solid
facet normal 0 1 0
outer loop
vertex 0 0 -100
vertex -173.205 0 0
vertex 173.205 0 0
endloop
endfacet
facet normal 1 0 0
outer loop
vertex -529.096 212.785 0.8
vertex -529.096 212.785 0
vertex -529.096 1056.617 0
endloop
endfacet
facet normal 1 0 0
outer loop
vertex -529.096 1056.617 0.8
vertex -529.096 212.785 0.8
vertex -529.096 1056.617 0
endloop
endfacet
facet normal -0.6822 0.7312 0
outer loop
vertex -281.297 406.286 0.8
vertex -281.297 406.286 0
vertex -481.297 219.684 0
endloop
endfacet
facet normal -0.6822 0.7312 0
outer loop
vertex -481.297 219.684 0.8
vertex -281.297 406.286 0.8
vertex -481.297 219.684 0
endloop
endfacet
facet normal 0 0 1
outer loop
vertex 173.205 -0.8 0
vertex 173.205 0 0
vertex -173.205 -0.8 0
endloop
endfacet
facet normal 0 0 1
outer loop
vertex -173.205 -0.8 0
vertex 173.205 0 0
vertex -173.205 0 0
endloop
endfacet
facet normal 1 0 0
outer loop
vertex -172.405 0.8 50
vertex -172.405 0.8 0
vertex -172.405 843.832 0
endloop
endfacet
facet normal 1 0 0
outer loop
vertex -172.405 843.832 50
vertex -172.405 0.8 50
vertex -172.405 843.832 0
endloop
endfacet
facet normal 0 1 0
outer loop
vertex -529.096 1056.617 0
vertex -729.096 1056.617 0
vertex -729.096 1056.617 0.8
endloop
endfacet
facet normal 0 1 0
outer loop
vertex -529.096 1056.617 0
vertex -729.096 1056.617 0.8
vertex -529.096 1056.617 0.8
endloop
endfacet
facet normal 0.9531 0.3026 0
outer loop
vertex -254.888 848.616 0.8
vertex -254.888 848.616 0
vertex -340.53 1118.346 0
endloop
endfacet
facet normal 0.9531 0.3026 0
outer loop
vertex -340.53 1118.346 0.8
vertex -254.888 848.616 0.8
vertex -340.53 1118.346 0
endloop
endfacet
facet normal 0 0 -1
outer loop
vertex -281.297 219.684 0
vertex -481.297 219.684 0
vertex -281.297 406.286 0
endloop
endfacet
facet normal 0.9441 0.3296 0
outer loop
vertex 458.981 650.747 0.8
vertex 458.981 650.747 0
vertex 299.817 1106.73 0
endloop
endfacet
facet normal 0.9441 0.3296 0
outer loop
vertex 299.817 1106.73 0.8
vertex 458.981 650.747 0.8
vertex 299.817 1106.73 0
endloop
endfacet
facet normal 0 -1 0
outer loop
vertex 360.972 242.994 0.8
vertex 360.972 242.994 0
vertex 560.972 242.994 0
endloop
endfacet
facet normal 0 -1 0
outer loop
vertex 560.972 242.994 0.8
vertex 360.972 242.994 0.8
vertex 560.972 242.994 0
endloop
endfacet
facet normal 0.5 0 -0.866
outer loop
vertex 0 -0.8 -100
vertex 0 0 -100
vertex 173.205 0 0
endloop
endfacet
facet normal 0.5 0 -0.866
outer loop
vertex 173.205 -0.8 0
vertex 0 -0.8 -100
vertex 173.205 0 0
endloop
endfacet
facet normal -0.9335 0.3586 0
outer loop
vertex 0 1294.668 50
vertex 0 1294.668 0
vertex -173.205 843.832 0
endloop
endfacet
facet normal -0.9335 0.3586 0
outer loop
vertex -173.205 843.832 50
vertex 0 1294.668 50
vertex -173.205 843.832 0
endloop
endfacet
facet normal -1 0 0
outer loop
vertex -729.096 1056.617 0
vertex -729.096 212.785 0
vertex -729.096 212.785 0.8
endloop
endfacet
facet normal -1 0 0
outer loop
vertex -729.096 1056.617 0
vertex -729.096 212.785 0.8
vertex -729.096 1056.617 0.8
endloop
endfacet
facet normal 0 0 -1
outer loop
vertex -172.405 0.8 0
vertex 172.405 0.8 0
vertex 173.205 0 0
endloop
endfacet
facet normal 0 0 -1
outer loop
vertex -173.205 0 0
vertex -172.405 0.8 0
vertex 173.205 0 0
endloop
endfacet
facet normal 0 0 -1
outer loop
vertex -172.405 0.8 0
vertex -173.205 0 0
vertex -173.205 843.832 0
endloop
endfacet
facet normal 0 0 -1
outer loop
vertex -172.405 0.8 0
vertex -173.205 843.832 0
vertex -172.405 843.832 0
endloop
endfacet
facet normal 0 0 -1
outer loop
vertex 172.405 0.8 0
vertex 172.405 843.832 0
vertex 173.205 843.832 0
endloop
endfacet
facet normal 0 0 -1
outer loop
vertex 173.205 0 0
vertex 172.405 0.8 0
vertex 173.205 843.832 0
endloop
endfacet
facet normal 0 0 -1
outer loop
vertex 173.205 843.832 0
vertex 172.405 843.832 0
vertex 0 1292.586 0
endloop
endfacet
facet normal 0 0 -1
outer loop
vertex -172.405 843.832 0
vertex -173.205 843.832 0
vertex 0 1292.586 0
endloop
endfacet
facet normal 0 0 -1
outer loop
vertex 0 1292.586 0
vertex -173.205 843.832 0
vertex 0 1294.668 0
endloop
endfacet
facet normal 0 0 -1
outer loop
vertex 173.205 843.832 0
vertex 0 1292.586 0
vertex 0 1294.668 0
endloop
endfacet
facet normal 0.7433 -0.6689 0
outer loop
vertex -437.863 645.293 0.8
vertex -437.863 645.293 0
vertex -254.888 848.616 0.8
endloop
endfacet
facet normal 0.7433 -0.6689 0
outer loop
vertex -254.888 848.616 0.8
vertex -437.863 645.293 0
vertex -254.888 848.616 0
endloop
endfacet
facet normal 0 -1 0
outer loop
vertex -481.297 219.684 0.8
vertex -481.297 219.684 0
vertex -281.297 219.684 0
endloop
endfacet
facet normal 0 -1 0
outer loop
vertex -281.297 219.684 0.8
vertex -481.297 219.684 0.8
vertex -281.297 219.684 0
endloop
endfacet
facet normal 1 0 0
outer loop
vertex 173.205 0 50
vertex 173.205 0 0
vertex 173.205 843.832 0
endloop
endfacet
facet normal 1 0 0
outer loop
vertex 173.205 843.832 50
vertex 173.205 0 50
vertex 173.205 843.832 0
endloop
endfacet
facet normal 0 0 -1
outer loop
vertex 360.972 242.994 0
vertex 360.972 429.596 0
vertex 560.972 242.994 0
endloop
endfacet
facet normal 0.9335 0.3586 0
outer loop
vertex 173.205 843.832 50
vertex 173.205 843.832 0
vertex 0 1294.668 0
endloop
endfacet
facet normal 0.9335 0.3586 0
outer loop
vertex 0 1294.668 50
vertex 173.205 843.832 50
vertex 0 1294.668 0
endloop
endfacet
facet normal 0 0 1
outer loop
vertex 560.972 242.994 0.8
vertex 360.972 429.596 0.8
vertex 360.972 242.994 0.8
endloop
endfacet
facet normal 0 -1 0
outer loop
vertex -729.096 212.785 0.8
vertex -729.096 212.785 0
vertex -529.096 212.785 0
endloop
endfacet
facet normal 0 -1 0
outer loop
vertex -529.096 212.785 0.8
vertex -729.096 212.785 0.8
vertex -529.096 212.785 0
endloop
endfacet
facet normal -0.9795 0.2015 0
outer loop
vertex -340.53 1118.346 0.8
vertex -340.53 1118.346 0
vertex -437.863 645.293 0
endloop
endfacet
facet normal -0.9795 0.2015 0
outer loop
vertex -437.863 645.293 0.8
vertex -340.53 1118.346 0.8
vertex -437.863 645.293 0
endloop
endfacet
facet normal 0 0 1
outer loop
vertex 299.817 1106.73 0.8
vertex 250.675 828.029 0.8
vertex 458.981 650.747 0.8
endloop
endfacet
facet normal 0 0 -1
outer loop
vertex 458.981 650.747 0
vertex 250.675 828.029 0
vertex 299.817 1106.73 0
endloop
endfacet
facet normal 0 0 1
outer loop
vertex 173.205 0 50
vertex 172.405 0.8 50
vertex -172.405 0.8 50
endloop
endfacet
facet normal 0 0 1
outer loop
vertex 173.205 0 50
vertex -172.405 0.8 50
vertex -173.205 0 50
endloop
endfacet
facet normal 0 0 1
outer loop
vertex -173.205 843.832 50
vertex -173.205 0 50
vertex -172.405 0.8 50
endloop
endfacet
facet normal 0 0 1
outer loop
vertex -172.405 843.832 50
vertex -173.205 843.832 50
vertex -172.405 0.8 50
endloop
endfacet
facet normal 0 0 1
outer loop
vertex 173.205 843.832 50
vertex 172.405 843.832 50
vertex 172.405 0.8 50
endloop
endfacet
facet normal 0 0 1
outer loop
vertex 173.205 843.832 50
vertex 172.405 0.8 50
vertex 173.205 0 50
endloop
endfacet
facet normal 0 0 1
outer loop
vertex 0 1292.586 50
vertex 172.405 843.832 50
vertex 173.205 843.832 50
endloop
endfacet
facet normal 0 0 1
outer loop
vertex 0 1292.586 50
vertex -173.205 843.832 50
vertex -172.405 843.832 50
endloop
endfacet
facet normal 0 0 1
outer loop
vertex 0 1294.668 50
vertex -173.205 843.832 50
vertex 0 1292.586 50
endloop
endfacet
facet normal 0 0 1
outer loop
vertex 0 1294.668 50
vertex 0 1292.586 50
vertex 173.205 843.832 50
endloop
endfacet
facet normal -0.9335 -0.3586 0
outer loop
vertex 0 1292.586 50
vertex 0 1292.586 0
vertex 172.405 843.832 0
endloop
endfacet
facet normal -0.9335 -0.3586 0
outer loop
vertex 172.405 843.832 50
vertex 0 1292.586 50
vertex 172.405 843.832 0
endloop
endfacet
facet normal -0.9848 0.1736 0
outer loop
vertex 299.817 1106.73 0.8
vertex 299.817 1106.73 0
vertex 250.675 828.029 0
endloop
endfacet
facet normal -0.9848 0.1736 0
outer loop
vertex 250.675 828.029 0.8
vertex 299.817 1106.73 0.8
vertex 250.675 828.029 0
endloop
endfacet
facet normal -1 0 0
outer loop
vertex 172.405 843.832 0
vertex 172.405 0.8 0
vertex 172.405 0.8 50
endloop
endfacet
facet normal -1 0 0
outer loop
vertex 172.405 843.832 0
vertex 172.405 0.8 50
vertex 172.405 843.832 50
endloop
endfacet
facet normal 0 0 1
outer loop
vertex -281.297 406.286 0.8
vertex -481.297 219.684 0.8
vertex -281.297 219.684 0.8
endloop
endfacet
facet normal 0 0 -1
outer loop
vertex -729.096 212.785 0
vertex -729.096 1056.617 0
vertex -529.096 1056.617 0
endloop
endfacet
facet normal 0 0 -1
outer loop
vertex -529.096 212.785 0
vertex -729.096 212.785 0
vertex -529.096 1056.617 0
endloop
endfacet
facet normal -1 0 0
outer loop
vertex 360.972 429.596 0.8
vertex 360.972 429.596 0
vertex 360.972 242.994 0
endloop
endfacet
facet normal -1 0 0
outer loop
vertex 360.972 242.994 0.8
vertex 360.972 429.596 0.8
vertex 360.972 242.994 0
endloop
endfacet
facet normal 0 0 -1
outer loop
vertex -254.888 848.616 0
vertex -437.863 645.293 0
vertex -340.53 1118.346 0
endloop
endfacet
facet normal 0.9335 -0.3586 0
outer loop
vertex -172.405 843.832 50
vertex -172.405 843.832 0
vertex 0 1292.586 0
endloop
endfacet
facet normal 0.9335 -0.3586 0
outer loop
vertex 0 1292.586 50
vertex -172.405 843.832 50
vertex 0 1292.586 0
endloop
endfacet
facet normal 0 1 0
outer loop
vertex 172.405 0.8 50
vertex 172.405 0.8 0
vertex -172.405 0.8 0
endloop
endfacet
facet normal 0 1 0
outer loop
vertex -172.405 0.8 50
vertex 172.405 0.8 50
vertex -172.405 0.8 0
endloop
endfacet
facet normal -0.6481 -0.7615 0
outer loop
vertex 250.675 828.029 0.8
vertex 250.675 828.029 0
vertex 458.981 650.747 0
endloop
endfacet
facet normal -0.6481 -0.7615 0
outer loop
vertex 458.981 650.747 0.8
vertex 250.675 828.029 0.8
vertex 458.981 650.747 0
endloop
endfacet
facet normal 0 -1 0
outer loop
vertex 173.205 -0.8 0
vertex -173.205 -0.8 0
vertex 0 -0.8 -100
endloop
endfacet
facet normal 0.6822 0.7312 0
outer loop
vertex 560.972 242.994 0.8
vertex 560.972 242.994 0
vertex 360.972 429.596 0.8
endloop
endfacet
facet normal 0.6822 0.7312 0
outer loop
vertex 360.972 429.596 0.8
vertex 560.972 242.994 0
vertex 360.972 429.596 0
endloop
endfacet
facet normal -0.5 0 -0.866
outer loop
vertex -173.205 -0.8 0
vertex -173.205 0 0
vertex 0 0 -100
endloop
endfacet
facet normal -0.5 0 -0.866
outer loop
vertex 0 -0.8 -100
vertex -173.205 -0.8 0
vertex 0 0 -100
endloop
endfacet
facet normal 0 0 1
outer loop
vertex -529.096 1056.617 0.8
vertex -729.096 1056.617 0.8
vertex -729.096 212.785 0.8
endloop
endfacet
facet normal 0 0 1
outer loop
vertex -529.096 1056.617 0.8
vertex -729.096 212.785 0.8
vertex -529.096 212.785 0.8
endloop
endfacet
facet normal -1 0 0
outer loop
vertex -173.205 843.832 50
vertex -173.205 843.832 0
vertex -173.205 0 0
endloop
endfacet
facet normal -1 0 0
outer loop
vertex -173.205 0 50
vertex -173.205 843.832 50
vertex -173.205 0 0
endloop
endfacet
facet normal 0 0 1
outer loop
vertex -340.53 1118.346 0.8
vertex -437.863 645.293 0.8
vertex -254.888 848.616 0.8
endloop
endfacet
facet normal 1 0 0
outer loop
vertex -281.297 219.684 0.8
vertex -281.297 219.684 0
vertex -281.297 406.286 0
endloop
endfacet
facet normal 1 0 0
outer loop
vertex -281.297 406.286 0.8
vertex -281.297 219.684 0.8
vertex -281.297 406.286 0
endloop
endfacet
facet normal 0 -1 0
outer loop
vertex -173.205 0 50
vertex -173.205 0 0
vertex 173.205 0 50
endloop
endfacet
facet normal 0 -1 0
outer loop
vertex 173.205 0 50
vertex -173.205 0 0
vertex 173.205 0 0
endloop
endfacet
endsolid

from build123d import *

# Parameters (mm, degrees)
F0_W      = 0.8
F0_H      = 843.032
F1_DEPTH  = 50
F0_W_2    = 172.405
F0_H_2    = 0.8
F2_DEPTH  = 50
F4_DEPTH  = 0.8
F5_W      = 200
F5_H      = 843.832
F6_DEPTH  = 0.8
F8_DEPTH  = 0.8
F10_DEPTH = 0.8
F12_DEPTH = 0.8
F14_DEPTH = 0.8


with BuildPart() as f1:
    # F0 (on Top) → F1 (new body)
    with BuildSketch(Plane.XY):
        with Locations((-172.805, 422.316)):
            Rectangle(F0_W, F0_H)
    extrude(amount=F1_DEPTH)

    # F0 (on Top) → F2 (join)
    with BuildSketch(Plane.XY):
        with Locations((-86.2025, 0.4)):
            Rectangle(F0_W_2, F0_H_2)
        with Locations((86.2025, 0.4)):
            Rectangle(F0_W_2, F0_H_2)
        with Locations((-172.805, 0.4)):
            Rectangle(F0_W, F0_H_2)
        with Locations((172.805, 0.4)):
            Rectangle(F0_W, F0_H_2)
        with Locations((-172.805, 422.316)):
            Rectangle(F0_W, F0_H)
        with Locations((172.805, 422.316)):
            Rectangle(F0_W, F0_H)
        Polygon((-173.205, 843.832), (-172.405, 843.832), (0, 1292.585885), (172.405, 843.832), (173.205, 843.832), (0, 1294.668209), align=None)
    extrude(amount=F2_DEPTH)


with BuildPart() as f4:
    # F3 (on Front) → F4 (new body)
    with BuildSketch(Plane.XZ):
        Polygon((173.205, 0), (0, 0), (0, -100), align=None)
        Polygon((0, -100), (0, 0), (-173.205, 0), align=None)
    extrude(amount=F4_DEPTH)


with BuildPart() as f6:
    # F5 (on Top) → F6 (new body)
    with BuildSketch(Plane.XY):
        with Locations((-629.095813, 634.701297)):
            Rectangle(F5_W, F5_H)
    extrude(amount=F6_DEPTH)


with BuildPart() as f8:
    # F7 (on Top) → F8 (new body)
    with BuildSketch(Plane.XY):
        Polygon((360.972251, 429.596173), (360.972251, 242.994173), (560.972251, 242.994173), align=None)
    extrude(amount=F8_DEPTH)


with BuildPart() as f10:
    # F9 (on Top) → F10 (new body)
    with BuildSketch(Plane.XY):
        Polygon((-481.296679, 219.683858), (-281.296679, 219.683858), (-281.296679, 406.285858), align=None)
    extrude(amount=F10_DEPTH)


with BuildPart() as f12:
    # F11 (on Top) → F12 (new body)
    with BuildSketch(Plane.XY):
        Polygon((-254.887716, 848.616024), (-340.530054, 1118.346241), (-437.863052, 645.292812), align=None)
    extrude(amount=F12_DEPTH)


with BuildPart() as f14:
    # F13 (on Top) → F14 (new body)
    with BuildSketch(Plane.XY):
        Polygon((458.98072, 650.746971), (299.81726, 1106.729704), (250.674826, 828.02911), align=None)
    extrude(amount=F14_DEPTH)


solid = Compound([f1.part, f4.part, f6.part, f8.part, f10.part, f12.part, f14.part])
